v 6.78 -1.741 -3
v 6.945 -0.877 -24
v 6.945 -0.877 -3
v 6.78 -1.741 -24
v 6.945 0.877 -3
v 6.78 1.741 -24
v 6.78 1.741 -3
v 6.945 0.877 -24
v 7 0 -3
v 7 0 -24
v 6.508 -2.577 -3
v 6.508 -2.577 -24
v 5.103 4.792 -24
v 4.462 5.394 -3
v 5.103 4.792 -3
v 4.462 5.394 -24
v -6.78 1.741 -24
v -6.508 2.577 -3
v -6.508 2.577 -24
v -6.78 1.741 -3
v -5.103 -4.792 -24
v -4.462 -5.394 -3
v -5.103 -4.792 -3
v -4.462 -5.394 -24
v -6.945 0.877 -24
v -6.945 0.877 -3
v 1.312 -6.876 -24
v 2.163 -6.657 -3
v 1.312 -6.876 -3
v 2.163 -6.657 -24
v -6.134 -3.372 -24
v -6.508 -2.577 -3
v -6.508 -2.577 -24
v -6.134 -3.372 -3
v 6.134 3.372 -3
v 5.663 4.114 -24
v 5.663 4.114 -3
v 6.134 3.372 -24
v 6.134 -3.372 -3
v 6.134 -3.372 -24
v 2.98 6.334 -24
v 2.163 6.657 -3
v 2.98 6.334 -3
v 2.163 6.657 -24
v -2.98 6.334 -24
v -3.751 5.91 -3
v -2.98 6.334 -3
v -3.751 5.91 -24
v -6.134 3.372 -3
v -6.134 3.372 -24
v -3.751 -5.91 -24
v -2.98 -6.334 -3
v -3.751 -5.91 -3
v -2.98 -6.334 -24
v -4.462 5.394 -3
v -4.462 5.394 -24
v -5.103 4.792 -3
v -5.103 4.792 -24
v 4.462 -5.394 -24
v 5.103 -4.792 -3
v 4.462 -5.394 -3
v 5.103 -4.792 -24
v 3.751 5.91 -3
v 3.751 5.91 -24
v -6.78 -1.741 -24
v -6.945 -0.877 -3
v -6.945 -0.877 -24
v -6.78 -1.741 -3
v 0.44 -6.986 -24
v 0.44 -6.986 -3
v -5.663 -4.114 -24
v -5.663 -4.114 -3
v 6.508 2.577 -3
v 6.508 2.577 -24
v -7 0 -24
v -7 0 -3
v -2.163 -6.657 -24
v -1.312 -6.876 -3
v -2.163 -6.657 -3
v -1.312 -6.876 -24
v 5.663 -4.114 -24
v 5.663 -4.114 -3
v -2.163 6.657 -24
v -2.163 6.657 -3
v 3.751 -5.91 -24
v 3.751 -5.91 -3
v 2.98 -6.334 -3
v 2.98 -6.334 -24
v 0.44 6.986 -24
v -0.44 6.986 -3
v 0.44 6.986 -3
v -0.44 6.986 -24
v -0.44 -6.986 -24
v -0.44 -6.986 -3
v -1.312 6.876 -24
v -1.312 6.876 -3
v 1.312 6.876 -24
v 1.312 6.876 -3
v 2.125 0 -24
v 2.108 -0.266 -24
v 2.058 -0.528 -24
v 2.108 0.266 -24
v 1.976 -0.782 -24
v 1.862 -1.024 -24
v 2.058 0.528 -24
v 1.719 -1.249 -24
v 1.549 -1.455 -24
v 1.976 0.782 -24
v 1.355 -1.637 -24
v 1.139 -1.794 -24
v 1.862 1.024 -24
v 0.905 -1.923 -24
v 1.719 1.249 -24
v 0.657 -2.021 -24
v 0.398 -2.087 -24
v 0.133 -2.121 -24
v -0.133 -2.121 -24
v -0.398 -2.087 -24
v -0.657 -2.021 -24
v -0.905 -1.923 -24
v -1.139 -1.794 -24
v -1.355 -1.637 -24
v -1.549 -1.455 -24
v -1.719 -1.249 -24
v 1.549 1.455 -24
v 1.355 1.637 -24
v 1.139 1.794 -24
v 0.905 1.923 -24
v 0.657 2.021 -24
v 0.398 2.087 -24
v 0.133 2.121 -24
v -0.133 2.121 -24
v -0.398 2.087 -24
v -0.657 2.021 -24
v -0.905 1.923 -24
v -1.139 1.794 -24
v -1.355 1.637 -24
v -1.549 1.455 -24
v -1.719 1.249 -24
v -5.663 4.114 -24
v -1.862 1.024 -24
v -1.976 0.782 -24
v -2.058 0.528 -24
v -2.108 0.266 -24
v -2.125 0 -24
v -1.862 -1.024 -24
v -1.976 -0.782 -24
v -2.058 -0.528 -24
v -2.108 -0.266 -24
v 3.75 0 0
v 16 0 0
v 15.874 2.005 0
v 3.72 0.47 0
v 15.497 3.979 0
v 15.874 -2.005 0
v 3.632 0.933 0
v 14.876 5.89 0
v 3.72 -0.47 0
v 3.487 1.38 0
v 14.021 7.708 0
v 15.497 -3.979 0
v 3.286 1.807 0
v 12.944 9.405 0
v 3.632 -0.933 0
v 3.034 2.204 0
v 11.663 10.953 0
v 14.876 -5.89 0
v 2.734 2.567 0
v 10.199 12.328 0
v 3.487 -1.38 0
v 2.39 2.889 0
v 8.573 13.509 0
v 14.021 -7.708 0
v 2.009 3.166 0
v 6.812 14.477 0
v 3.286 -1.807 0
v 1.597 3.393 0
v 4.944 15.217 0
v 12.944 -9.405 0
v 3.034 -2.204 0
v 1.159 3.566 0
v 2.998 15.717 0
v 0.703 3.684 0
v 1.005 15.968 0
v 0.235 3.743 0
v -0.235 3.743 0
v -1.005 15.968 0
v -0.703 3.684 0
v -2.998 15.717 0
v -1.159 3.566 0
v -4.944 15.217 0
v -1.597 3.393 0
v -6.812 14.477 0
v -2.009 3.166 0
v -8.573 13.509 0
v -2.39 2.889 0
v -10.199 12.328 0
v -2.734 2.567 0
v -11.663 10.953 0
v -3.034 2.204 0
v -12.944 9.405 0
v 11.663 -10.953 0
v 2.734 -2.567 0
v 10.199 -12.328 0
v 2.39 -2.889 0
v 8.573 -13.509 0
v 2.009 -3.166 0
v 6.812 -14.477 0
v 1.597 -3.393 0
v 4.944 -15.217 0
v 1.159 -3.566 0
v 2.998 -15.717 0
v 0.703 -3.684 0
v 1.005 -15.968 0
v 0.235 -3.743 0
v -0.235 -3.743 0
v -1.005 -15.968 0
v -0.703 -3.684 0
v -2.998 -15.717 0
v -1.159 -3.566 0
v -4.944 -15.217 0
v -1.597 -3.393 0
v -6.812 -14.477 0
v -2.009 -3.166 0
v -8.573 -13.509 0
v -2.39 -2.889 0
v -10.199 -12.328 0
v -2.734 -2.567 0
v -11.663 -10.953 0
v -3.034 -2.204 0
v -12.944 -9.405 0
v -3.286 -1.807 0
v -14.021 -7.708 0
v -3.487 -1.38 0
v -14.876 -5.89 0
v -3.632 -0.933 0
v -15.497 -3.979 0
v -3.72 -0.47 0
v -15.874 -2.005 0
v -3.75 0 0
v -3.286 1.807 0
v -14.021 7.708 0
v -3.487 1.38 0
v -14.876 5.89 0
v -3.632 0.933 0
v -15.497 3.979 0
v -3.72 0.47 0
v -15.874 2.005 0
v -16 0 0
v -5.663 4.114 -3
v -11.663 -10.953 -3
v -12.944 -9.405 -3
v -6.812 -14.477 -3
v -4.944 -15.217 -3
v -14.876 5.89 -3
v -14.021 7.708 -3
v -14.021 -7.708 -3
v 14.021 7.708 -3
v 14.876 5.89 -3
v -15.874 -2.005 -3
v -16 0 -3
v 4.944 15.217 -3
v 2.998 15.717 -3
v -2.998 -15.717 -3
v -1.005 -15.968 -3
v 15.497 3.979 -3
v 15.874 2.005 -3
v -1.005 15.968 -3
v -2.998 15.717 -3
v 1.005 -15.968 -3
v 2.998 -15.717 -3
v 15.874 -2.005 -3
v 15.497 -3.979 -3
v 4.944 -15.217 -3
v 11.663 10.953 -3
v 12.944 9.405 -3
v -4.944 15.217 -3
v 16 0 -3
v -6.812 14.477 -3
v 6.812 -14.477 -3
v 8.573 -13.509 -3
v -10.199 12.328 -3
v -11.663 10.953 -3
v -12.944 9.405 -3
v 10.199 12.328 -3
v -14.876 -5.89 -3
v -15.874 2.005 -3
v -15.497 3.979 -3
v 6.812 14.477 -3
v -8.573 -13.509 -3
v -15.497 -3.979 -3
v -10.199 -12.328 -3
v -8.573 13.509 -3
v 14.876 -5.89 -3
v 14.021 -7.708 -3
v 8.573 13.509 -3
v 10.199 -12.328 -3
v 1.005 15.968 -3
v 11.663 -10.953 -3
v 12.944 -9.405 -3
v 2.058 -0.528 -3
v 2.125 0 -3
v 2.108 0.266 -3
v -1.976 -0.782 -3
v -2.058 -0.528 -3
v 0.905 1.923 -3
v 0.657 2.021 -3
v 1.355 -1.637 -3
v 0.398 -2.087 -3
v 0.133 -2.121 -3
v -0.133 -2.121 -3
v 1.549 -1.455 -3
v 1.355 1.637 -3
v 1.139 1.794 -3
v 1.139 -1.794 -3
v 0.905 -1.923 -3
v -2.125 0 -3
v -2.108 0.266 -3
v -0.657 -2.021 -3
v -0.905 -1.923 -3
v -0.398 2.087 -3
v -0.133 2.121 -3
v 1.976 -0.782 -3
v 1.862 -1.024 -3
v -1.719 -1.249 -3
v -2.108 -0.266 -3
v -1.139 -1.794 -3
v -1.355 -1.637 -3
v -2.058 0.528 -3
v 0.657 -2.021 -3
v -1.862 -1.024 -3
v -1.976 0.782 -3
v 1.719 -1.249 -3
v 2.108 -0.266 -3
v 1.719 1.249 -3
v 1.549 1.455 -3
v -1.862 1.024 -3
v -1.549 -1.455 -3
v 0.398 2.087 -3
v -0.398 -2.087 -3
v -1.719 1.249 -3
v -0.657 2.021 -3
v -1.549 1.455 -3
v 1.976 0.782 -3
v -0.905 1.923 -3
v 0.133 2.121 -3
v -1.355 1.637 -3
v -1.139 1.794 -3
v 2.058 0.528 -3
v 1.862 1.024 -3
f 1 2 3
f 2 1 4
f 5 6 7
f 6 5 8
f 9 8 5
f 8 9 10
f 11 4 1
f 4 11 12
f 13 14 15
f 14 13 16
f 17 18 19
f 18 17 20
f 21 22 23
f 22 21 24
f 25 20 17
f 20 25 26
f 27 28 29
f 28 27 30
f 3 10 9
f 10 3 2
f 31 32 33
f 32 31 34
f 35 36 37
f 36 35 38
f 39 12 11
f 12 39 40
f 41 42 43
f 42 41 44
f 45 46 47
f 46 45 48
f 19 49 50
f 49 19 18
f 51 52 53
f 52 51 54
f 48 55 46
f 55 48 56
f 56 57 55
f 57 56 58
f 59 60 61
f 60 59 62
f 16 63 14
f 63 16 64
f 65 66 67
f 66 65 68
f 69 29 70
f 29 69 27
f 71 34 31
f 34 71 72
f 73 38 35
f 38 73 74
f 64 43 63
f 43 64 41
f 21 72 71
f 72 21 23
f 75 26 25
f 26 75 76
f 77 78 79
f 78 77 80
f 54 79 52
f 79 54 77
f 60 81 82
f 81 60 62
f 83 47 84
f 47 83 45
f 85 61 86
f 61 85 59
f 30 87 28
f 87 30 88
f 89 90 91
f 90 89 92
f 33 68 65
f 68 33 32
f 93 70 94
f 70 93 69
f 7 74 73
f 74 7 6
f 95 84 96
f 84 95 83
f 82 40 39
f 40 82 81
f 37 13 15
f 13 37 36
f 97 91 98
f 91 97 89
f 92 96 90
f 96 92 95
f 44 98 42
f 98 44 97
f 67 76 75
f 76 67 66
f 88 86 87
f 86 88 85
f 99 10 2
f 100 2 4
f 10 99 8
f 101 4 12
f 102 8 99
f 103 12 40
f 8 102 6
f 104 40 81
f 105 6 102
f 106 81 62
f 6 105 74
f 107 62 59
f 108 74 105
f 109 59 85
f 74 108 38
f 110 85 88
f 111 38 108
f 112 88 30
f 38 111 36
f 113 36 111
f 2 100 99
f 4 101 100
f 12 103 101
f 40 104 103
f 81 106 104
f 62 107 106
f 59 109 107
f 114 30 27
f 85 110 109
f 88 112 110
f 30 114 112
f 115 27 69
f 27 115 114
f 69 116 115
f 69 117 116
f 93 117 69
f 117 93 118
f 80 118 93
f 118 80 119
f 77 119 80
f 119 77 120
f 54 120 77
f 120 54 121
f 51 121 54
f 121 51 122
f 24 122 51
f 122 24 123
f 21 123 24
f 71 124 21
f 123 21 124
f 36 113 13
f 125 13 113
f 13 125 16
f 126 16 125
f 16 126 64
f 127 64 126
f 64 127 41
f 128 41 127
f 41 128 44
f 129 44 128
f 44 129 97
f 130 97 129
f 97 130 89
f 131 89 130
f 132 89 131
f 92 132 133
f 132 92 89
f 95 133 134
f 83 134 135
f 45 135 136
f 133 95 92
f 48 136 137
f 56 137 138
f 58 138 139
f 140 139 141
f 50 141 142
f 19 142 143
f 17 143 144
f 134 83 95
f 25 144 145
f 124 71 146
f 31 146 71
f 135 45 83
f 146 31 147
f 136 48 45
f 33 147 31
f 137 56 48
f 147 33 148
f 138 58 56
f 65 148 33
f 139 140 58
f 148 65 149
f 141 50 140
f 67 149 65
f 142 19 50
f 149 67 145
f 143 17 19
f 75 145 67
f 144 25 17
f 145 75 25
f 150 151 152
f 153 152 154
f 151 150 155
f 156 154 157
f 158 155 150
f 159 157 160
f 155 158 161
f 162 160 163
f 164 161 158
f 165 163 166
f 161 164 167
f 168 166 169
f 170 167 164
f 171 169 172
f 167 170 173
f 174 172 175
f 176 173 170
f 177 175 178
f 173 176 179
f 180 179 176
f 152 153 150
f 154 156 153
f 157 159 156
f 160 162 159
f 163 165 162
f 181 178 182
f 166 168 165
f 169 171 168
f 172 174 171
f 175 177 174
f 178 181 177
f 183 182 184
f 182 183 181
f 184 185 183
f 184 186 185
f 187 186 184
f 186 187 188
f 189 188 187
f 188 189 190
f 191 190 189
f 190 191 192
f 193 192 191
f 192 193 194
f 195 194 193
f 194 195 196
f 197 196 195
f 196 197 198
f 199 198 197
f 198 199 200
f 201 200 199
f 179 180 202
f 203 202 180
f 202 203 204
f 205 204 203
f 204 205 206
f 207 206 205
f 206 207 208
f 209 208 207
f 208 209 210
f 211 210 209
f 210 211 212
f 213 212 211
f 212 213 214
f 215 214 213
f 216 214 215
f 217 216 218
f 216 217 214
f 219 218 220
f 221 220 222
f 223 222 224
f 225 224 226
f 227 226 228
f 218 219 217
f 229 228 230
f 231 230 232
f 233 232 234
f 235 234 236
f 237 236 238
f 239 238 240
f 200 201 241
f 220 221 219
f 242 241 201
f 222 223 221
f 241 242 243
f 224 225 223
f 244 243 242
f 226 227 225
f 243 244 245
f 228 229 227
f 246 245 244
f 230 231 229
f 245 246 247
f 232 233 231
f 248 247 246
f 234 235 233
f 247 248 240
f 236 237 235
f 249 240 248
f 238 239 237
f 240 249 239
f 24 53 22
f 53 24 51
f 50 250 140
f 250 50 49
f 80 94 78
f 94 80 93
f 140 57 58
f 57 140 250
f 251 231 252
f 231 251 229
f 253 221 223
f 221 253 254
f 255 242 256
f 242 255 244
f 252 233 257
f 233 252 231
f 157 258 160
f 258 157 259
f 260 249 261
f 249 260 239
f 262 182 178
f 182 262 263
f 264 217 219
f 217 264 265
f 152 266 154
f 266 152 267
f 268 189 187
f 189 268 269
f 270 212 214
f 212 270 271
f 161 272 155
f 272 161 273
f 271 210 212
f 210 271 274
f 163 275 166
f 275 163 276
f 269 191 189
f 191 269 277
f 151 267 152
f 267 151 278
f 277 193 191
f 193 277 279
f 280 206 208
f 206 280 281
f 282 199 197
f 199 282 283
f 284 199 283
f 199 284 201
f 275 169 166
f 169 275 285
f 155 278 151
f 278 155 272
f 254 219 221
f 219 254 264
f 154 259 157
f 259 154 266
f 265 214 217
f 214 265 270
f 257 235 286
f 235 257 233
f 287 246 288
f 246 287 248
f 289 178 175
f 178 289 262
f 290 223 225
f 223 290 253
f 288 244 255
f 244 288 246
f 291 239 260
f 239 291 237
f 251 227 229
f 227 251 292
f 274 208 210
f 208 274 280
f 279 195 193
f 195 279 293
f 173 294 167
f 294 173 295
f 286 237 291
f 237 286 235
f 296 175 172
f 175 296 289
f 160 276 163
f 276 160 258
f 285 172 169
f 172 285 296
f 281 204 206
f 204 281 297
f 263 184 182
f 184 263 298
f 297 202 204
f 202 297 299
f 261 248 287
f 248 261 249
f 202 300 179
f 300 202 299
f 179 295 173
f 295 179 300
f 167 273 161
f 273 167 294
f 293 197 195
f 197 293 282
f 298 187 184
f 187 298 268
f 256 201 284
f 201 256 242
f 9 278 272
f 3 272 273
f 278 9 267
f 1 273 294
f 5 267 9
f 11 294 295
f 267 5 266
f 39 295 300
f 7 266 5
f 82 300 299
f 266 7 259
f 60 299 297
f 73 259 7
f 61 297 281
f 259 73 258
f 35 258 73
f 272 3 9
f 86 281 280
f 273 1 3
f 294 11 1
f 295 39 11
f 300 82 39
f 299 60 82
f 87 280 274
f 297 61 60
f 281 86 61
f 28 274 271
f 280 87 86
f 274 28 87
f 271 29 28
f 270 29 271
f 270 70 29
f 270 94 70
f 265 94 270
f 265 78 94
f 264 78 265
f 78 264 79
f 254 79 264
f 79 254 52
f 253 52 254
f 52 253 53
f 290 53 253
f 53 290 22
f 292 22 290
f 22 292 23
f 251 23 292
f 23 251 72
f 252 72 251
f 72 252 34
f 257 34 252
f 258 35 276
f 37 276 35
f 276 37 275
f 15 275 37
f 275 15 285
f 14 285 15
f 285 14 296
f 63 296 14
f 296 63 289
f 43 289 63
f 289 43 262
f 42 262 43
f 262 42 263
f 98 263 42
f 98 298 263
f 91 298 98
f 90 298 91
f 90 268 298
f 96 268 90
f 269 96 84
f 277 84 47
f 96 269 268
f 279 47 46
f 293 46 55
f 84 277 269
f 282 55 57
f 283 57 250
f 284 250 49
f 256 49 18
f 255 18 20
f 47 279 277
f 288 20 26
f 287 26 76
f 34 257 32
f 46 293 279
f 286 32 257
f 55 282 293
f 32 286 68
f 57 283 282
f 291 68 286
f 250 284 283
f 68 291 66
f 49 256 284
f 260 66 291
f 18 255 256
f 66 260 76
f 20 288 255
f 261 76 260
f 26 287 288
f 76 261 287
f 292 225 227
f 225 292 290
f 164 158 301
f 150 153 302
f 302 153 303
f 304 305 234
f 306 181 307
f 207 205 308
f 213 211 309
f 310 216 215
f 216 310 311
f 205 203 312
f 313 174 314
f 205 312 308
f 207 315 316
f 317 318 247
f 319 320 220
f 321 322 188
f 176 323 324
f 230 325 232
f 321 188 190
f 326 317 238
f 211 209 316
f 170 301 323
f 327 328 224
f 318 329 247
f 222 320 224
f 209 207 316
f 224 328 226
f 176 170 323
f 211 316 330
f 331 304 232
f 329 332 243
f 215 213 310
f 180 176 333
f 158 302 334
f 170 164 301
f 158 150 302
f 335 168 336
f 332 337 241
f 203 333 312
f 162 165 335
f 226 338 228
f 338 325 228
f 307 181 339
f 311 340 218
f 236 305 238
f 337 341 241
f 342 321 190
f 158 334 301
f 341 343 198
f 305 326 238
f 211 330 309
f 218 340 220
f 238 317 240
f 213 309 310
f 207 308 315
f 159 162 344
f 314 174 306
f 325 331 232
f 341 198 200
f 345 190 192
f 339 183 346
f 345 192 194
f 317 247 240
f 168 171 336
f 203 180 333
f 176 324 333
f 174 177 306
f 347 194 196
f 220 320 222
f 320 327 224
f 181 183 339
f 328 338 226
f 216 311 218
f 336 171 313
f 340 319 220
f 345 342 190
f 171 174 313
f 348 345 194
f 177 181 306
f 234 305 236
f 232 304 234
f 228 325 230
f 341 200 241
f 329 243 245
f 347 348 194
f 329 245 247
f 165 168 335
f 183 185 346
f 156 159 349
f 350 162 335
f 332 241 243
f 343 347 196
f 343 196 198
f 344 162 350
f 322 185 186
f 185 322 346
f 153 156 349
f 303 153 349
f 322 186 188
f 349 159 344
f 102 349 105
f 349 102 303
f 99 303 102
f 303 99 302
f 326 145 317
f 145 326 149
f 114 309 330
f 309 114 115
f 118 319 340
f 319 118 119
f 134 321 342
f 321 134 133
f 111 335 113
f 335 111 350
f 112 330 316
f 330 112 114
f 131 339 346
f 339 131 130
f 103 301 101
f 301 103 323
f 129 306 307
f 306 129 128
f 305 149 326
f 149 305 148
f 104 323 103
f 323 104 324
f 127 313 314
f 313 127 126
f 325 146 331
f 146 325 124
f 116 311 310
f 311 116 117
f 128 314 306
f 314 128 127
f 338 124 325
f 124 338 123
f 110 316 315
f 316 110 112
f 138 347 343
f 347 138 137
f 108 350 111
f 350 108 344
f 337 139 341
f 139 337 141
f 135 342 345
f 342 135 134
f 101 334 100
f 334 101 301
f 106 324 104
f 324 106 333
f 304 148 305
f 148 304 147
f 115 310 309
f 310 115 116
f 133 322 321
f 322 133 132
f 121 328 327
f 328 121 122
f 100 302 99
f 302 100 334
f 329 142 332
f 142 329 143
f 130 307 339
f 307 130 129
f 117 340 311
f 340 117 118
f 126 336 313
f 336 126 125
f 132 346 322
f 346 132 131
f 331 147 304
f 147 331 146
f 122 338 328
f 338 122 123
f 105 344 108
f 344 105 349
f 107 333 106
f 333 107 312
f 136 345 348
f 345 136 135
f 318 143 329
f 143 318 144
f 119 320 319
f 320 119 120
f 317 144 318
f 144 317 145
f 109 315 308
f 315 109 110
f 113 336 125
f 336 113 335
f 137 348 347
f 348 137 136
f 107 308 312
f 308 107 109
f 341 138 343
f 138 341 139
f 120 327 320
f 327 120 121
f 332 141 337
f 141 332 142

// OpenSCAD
$fn = 50;


difference() {
	union() {
		translate(v = [0, 0, -24.0000000000]) {
			cylinder(h = 24, r = 7.0000000000);
		}
		translate(v = [0, 0, -3.0000000000]) {
			cylinder(h = 3, r = 16.0000000000);
		}
	}
	union() {
		translate(v = [0, 0, 0]) {
			rotate(a = [0, 0, 0]) {
				difference() {
					union() {
						#translate(v = [0, 0, -24.0000000000]) {
							cylinder(h = 24, r = 2.0000000000);
						}
						#translate(v = [0, 0, -3]) {
							cylinder(h = 3, r = 7.0000000000, r1 = 2.1250000000, r2 = 3.7500000000);
						}
						#translate(v = [0, 0, -24.0000000000]) {
							cylinder(h = 24, r = 2.1250000000);
						}
						#translate(v = [0, 0, -24.0000000000]) {
							cylinder(h = 24, r = 2.0000000000);
						}
					}
					union();
				}
			}
		}
	}
}
